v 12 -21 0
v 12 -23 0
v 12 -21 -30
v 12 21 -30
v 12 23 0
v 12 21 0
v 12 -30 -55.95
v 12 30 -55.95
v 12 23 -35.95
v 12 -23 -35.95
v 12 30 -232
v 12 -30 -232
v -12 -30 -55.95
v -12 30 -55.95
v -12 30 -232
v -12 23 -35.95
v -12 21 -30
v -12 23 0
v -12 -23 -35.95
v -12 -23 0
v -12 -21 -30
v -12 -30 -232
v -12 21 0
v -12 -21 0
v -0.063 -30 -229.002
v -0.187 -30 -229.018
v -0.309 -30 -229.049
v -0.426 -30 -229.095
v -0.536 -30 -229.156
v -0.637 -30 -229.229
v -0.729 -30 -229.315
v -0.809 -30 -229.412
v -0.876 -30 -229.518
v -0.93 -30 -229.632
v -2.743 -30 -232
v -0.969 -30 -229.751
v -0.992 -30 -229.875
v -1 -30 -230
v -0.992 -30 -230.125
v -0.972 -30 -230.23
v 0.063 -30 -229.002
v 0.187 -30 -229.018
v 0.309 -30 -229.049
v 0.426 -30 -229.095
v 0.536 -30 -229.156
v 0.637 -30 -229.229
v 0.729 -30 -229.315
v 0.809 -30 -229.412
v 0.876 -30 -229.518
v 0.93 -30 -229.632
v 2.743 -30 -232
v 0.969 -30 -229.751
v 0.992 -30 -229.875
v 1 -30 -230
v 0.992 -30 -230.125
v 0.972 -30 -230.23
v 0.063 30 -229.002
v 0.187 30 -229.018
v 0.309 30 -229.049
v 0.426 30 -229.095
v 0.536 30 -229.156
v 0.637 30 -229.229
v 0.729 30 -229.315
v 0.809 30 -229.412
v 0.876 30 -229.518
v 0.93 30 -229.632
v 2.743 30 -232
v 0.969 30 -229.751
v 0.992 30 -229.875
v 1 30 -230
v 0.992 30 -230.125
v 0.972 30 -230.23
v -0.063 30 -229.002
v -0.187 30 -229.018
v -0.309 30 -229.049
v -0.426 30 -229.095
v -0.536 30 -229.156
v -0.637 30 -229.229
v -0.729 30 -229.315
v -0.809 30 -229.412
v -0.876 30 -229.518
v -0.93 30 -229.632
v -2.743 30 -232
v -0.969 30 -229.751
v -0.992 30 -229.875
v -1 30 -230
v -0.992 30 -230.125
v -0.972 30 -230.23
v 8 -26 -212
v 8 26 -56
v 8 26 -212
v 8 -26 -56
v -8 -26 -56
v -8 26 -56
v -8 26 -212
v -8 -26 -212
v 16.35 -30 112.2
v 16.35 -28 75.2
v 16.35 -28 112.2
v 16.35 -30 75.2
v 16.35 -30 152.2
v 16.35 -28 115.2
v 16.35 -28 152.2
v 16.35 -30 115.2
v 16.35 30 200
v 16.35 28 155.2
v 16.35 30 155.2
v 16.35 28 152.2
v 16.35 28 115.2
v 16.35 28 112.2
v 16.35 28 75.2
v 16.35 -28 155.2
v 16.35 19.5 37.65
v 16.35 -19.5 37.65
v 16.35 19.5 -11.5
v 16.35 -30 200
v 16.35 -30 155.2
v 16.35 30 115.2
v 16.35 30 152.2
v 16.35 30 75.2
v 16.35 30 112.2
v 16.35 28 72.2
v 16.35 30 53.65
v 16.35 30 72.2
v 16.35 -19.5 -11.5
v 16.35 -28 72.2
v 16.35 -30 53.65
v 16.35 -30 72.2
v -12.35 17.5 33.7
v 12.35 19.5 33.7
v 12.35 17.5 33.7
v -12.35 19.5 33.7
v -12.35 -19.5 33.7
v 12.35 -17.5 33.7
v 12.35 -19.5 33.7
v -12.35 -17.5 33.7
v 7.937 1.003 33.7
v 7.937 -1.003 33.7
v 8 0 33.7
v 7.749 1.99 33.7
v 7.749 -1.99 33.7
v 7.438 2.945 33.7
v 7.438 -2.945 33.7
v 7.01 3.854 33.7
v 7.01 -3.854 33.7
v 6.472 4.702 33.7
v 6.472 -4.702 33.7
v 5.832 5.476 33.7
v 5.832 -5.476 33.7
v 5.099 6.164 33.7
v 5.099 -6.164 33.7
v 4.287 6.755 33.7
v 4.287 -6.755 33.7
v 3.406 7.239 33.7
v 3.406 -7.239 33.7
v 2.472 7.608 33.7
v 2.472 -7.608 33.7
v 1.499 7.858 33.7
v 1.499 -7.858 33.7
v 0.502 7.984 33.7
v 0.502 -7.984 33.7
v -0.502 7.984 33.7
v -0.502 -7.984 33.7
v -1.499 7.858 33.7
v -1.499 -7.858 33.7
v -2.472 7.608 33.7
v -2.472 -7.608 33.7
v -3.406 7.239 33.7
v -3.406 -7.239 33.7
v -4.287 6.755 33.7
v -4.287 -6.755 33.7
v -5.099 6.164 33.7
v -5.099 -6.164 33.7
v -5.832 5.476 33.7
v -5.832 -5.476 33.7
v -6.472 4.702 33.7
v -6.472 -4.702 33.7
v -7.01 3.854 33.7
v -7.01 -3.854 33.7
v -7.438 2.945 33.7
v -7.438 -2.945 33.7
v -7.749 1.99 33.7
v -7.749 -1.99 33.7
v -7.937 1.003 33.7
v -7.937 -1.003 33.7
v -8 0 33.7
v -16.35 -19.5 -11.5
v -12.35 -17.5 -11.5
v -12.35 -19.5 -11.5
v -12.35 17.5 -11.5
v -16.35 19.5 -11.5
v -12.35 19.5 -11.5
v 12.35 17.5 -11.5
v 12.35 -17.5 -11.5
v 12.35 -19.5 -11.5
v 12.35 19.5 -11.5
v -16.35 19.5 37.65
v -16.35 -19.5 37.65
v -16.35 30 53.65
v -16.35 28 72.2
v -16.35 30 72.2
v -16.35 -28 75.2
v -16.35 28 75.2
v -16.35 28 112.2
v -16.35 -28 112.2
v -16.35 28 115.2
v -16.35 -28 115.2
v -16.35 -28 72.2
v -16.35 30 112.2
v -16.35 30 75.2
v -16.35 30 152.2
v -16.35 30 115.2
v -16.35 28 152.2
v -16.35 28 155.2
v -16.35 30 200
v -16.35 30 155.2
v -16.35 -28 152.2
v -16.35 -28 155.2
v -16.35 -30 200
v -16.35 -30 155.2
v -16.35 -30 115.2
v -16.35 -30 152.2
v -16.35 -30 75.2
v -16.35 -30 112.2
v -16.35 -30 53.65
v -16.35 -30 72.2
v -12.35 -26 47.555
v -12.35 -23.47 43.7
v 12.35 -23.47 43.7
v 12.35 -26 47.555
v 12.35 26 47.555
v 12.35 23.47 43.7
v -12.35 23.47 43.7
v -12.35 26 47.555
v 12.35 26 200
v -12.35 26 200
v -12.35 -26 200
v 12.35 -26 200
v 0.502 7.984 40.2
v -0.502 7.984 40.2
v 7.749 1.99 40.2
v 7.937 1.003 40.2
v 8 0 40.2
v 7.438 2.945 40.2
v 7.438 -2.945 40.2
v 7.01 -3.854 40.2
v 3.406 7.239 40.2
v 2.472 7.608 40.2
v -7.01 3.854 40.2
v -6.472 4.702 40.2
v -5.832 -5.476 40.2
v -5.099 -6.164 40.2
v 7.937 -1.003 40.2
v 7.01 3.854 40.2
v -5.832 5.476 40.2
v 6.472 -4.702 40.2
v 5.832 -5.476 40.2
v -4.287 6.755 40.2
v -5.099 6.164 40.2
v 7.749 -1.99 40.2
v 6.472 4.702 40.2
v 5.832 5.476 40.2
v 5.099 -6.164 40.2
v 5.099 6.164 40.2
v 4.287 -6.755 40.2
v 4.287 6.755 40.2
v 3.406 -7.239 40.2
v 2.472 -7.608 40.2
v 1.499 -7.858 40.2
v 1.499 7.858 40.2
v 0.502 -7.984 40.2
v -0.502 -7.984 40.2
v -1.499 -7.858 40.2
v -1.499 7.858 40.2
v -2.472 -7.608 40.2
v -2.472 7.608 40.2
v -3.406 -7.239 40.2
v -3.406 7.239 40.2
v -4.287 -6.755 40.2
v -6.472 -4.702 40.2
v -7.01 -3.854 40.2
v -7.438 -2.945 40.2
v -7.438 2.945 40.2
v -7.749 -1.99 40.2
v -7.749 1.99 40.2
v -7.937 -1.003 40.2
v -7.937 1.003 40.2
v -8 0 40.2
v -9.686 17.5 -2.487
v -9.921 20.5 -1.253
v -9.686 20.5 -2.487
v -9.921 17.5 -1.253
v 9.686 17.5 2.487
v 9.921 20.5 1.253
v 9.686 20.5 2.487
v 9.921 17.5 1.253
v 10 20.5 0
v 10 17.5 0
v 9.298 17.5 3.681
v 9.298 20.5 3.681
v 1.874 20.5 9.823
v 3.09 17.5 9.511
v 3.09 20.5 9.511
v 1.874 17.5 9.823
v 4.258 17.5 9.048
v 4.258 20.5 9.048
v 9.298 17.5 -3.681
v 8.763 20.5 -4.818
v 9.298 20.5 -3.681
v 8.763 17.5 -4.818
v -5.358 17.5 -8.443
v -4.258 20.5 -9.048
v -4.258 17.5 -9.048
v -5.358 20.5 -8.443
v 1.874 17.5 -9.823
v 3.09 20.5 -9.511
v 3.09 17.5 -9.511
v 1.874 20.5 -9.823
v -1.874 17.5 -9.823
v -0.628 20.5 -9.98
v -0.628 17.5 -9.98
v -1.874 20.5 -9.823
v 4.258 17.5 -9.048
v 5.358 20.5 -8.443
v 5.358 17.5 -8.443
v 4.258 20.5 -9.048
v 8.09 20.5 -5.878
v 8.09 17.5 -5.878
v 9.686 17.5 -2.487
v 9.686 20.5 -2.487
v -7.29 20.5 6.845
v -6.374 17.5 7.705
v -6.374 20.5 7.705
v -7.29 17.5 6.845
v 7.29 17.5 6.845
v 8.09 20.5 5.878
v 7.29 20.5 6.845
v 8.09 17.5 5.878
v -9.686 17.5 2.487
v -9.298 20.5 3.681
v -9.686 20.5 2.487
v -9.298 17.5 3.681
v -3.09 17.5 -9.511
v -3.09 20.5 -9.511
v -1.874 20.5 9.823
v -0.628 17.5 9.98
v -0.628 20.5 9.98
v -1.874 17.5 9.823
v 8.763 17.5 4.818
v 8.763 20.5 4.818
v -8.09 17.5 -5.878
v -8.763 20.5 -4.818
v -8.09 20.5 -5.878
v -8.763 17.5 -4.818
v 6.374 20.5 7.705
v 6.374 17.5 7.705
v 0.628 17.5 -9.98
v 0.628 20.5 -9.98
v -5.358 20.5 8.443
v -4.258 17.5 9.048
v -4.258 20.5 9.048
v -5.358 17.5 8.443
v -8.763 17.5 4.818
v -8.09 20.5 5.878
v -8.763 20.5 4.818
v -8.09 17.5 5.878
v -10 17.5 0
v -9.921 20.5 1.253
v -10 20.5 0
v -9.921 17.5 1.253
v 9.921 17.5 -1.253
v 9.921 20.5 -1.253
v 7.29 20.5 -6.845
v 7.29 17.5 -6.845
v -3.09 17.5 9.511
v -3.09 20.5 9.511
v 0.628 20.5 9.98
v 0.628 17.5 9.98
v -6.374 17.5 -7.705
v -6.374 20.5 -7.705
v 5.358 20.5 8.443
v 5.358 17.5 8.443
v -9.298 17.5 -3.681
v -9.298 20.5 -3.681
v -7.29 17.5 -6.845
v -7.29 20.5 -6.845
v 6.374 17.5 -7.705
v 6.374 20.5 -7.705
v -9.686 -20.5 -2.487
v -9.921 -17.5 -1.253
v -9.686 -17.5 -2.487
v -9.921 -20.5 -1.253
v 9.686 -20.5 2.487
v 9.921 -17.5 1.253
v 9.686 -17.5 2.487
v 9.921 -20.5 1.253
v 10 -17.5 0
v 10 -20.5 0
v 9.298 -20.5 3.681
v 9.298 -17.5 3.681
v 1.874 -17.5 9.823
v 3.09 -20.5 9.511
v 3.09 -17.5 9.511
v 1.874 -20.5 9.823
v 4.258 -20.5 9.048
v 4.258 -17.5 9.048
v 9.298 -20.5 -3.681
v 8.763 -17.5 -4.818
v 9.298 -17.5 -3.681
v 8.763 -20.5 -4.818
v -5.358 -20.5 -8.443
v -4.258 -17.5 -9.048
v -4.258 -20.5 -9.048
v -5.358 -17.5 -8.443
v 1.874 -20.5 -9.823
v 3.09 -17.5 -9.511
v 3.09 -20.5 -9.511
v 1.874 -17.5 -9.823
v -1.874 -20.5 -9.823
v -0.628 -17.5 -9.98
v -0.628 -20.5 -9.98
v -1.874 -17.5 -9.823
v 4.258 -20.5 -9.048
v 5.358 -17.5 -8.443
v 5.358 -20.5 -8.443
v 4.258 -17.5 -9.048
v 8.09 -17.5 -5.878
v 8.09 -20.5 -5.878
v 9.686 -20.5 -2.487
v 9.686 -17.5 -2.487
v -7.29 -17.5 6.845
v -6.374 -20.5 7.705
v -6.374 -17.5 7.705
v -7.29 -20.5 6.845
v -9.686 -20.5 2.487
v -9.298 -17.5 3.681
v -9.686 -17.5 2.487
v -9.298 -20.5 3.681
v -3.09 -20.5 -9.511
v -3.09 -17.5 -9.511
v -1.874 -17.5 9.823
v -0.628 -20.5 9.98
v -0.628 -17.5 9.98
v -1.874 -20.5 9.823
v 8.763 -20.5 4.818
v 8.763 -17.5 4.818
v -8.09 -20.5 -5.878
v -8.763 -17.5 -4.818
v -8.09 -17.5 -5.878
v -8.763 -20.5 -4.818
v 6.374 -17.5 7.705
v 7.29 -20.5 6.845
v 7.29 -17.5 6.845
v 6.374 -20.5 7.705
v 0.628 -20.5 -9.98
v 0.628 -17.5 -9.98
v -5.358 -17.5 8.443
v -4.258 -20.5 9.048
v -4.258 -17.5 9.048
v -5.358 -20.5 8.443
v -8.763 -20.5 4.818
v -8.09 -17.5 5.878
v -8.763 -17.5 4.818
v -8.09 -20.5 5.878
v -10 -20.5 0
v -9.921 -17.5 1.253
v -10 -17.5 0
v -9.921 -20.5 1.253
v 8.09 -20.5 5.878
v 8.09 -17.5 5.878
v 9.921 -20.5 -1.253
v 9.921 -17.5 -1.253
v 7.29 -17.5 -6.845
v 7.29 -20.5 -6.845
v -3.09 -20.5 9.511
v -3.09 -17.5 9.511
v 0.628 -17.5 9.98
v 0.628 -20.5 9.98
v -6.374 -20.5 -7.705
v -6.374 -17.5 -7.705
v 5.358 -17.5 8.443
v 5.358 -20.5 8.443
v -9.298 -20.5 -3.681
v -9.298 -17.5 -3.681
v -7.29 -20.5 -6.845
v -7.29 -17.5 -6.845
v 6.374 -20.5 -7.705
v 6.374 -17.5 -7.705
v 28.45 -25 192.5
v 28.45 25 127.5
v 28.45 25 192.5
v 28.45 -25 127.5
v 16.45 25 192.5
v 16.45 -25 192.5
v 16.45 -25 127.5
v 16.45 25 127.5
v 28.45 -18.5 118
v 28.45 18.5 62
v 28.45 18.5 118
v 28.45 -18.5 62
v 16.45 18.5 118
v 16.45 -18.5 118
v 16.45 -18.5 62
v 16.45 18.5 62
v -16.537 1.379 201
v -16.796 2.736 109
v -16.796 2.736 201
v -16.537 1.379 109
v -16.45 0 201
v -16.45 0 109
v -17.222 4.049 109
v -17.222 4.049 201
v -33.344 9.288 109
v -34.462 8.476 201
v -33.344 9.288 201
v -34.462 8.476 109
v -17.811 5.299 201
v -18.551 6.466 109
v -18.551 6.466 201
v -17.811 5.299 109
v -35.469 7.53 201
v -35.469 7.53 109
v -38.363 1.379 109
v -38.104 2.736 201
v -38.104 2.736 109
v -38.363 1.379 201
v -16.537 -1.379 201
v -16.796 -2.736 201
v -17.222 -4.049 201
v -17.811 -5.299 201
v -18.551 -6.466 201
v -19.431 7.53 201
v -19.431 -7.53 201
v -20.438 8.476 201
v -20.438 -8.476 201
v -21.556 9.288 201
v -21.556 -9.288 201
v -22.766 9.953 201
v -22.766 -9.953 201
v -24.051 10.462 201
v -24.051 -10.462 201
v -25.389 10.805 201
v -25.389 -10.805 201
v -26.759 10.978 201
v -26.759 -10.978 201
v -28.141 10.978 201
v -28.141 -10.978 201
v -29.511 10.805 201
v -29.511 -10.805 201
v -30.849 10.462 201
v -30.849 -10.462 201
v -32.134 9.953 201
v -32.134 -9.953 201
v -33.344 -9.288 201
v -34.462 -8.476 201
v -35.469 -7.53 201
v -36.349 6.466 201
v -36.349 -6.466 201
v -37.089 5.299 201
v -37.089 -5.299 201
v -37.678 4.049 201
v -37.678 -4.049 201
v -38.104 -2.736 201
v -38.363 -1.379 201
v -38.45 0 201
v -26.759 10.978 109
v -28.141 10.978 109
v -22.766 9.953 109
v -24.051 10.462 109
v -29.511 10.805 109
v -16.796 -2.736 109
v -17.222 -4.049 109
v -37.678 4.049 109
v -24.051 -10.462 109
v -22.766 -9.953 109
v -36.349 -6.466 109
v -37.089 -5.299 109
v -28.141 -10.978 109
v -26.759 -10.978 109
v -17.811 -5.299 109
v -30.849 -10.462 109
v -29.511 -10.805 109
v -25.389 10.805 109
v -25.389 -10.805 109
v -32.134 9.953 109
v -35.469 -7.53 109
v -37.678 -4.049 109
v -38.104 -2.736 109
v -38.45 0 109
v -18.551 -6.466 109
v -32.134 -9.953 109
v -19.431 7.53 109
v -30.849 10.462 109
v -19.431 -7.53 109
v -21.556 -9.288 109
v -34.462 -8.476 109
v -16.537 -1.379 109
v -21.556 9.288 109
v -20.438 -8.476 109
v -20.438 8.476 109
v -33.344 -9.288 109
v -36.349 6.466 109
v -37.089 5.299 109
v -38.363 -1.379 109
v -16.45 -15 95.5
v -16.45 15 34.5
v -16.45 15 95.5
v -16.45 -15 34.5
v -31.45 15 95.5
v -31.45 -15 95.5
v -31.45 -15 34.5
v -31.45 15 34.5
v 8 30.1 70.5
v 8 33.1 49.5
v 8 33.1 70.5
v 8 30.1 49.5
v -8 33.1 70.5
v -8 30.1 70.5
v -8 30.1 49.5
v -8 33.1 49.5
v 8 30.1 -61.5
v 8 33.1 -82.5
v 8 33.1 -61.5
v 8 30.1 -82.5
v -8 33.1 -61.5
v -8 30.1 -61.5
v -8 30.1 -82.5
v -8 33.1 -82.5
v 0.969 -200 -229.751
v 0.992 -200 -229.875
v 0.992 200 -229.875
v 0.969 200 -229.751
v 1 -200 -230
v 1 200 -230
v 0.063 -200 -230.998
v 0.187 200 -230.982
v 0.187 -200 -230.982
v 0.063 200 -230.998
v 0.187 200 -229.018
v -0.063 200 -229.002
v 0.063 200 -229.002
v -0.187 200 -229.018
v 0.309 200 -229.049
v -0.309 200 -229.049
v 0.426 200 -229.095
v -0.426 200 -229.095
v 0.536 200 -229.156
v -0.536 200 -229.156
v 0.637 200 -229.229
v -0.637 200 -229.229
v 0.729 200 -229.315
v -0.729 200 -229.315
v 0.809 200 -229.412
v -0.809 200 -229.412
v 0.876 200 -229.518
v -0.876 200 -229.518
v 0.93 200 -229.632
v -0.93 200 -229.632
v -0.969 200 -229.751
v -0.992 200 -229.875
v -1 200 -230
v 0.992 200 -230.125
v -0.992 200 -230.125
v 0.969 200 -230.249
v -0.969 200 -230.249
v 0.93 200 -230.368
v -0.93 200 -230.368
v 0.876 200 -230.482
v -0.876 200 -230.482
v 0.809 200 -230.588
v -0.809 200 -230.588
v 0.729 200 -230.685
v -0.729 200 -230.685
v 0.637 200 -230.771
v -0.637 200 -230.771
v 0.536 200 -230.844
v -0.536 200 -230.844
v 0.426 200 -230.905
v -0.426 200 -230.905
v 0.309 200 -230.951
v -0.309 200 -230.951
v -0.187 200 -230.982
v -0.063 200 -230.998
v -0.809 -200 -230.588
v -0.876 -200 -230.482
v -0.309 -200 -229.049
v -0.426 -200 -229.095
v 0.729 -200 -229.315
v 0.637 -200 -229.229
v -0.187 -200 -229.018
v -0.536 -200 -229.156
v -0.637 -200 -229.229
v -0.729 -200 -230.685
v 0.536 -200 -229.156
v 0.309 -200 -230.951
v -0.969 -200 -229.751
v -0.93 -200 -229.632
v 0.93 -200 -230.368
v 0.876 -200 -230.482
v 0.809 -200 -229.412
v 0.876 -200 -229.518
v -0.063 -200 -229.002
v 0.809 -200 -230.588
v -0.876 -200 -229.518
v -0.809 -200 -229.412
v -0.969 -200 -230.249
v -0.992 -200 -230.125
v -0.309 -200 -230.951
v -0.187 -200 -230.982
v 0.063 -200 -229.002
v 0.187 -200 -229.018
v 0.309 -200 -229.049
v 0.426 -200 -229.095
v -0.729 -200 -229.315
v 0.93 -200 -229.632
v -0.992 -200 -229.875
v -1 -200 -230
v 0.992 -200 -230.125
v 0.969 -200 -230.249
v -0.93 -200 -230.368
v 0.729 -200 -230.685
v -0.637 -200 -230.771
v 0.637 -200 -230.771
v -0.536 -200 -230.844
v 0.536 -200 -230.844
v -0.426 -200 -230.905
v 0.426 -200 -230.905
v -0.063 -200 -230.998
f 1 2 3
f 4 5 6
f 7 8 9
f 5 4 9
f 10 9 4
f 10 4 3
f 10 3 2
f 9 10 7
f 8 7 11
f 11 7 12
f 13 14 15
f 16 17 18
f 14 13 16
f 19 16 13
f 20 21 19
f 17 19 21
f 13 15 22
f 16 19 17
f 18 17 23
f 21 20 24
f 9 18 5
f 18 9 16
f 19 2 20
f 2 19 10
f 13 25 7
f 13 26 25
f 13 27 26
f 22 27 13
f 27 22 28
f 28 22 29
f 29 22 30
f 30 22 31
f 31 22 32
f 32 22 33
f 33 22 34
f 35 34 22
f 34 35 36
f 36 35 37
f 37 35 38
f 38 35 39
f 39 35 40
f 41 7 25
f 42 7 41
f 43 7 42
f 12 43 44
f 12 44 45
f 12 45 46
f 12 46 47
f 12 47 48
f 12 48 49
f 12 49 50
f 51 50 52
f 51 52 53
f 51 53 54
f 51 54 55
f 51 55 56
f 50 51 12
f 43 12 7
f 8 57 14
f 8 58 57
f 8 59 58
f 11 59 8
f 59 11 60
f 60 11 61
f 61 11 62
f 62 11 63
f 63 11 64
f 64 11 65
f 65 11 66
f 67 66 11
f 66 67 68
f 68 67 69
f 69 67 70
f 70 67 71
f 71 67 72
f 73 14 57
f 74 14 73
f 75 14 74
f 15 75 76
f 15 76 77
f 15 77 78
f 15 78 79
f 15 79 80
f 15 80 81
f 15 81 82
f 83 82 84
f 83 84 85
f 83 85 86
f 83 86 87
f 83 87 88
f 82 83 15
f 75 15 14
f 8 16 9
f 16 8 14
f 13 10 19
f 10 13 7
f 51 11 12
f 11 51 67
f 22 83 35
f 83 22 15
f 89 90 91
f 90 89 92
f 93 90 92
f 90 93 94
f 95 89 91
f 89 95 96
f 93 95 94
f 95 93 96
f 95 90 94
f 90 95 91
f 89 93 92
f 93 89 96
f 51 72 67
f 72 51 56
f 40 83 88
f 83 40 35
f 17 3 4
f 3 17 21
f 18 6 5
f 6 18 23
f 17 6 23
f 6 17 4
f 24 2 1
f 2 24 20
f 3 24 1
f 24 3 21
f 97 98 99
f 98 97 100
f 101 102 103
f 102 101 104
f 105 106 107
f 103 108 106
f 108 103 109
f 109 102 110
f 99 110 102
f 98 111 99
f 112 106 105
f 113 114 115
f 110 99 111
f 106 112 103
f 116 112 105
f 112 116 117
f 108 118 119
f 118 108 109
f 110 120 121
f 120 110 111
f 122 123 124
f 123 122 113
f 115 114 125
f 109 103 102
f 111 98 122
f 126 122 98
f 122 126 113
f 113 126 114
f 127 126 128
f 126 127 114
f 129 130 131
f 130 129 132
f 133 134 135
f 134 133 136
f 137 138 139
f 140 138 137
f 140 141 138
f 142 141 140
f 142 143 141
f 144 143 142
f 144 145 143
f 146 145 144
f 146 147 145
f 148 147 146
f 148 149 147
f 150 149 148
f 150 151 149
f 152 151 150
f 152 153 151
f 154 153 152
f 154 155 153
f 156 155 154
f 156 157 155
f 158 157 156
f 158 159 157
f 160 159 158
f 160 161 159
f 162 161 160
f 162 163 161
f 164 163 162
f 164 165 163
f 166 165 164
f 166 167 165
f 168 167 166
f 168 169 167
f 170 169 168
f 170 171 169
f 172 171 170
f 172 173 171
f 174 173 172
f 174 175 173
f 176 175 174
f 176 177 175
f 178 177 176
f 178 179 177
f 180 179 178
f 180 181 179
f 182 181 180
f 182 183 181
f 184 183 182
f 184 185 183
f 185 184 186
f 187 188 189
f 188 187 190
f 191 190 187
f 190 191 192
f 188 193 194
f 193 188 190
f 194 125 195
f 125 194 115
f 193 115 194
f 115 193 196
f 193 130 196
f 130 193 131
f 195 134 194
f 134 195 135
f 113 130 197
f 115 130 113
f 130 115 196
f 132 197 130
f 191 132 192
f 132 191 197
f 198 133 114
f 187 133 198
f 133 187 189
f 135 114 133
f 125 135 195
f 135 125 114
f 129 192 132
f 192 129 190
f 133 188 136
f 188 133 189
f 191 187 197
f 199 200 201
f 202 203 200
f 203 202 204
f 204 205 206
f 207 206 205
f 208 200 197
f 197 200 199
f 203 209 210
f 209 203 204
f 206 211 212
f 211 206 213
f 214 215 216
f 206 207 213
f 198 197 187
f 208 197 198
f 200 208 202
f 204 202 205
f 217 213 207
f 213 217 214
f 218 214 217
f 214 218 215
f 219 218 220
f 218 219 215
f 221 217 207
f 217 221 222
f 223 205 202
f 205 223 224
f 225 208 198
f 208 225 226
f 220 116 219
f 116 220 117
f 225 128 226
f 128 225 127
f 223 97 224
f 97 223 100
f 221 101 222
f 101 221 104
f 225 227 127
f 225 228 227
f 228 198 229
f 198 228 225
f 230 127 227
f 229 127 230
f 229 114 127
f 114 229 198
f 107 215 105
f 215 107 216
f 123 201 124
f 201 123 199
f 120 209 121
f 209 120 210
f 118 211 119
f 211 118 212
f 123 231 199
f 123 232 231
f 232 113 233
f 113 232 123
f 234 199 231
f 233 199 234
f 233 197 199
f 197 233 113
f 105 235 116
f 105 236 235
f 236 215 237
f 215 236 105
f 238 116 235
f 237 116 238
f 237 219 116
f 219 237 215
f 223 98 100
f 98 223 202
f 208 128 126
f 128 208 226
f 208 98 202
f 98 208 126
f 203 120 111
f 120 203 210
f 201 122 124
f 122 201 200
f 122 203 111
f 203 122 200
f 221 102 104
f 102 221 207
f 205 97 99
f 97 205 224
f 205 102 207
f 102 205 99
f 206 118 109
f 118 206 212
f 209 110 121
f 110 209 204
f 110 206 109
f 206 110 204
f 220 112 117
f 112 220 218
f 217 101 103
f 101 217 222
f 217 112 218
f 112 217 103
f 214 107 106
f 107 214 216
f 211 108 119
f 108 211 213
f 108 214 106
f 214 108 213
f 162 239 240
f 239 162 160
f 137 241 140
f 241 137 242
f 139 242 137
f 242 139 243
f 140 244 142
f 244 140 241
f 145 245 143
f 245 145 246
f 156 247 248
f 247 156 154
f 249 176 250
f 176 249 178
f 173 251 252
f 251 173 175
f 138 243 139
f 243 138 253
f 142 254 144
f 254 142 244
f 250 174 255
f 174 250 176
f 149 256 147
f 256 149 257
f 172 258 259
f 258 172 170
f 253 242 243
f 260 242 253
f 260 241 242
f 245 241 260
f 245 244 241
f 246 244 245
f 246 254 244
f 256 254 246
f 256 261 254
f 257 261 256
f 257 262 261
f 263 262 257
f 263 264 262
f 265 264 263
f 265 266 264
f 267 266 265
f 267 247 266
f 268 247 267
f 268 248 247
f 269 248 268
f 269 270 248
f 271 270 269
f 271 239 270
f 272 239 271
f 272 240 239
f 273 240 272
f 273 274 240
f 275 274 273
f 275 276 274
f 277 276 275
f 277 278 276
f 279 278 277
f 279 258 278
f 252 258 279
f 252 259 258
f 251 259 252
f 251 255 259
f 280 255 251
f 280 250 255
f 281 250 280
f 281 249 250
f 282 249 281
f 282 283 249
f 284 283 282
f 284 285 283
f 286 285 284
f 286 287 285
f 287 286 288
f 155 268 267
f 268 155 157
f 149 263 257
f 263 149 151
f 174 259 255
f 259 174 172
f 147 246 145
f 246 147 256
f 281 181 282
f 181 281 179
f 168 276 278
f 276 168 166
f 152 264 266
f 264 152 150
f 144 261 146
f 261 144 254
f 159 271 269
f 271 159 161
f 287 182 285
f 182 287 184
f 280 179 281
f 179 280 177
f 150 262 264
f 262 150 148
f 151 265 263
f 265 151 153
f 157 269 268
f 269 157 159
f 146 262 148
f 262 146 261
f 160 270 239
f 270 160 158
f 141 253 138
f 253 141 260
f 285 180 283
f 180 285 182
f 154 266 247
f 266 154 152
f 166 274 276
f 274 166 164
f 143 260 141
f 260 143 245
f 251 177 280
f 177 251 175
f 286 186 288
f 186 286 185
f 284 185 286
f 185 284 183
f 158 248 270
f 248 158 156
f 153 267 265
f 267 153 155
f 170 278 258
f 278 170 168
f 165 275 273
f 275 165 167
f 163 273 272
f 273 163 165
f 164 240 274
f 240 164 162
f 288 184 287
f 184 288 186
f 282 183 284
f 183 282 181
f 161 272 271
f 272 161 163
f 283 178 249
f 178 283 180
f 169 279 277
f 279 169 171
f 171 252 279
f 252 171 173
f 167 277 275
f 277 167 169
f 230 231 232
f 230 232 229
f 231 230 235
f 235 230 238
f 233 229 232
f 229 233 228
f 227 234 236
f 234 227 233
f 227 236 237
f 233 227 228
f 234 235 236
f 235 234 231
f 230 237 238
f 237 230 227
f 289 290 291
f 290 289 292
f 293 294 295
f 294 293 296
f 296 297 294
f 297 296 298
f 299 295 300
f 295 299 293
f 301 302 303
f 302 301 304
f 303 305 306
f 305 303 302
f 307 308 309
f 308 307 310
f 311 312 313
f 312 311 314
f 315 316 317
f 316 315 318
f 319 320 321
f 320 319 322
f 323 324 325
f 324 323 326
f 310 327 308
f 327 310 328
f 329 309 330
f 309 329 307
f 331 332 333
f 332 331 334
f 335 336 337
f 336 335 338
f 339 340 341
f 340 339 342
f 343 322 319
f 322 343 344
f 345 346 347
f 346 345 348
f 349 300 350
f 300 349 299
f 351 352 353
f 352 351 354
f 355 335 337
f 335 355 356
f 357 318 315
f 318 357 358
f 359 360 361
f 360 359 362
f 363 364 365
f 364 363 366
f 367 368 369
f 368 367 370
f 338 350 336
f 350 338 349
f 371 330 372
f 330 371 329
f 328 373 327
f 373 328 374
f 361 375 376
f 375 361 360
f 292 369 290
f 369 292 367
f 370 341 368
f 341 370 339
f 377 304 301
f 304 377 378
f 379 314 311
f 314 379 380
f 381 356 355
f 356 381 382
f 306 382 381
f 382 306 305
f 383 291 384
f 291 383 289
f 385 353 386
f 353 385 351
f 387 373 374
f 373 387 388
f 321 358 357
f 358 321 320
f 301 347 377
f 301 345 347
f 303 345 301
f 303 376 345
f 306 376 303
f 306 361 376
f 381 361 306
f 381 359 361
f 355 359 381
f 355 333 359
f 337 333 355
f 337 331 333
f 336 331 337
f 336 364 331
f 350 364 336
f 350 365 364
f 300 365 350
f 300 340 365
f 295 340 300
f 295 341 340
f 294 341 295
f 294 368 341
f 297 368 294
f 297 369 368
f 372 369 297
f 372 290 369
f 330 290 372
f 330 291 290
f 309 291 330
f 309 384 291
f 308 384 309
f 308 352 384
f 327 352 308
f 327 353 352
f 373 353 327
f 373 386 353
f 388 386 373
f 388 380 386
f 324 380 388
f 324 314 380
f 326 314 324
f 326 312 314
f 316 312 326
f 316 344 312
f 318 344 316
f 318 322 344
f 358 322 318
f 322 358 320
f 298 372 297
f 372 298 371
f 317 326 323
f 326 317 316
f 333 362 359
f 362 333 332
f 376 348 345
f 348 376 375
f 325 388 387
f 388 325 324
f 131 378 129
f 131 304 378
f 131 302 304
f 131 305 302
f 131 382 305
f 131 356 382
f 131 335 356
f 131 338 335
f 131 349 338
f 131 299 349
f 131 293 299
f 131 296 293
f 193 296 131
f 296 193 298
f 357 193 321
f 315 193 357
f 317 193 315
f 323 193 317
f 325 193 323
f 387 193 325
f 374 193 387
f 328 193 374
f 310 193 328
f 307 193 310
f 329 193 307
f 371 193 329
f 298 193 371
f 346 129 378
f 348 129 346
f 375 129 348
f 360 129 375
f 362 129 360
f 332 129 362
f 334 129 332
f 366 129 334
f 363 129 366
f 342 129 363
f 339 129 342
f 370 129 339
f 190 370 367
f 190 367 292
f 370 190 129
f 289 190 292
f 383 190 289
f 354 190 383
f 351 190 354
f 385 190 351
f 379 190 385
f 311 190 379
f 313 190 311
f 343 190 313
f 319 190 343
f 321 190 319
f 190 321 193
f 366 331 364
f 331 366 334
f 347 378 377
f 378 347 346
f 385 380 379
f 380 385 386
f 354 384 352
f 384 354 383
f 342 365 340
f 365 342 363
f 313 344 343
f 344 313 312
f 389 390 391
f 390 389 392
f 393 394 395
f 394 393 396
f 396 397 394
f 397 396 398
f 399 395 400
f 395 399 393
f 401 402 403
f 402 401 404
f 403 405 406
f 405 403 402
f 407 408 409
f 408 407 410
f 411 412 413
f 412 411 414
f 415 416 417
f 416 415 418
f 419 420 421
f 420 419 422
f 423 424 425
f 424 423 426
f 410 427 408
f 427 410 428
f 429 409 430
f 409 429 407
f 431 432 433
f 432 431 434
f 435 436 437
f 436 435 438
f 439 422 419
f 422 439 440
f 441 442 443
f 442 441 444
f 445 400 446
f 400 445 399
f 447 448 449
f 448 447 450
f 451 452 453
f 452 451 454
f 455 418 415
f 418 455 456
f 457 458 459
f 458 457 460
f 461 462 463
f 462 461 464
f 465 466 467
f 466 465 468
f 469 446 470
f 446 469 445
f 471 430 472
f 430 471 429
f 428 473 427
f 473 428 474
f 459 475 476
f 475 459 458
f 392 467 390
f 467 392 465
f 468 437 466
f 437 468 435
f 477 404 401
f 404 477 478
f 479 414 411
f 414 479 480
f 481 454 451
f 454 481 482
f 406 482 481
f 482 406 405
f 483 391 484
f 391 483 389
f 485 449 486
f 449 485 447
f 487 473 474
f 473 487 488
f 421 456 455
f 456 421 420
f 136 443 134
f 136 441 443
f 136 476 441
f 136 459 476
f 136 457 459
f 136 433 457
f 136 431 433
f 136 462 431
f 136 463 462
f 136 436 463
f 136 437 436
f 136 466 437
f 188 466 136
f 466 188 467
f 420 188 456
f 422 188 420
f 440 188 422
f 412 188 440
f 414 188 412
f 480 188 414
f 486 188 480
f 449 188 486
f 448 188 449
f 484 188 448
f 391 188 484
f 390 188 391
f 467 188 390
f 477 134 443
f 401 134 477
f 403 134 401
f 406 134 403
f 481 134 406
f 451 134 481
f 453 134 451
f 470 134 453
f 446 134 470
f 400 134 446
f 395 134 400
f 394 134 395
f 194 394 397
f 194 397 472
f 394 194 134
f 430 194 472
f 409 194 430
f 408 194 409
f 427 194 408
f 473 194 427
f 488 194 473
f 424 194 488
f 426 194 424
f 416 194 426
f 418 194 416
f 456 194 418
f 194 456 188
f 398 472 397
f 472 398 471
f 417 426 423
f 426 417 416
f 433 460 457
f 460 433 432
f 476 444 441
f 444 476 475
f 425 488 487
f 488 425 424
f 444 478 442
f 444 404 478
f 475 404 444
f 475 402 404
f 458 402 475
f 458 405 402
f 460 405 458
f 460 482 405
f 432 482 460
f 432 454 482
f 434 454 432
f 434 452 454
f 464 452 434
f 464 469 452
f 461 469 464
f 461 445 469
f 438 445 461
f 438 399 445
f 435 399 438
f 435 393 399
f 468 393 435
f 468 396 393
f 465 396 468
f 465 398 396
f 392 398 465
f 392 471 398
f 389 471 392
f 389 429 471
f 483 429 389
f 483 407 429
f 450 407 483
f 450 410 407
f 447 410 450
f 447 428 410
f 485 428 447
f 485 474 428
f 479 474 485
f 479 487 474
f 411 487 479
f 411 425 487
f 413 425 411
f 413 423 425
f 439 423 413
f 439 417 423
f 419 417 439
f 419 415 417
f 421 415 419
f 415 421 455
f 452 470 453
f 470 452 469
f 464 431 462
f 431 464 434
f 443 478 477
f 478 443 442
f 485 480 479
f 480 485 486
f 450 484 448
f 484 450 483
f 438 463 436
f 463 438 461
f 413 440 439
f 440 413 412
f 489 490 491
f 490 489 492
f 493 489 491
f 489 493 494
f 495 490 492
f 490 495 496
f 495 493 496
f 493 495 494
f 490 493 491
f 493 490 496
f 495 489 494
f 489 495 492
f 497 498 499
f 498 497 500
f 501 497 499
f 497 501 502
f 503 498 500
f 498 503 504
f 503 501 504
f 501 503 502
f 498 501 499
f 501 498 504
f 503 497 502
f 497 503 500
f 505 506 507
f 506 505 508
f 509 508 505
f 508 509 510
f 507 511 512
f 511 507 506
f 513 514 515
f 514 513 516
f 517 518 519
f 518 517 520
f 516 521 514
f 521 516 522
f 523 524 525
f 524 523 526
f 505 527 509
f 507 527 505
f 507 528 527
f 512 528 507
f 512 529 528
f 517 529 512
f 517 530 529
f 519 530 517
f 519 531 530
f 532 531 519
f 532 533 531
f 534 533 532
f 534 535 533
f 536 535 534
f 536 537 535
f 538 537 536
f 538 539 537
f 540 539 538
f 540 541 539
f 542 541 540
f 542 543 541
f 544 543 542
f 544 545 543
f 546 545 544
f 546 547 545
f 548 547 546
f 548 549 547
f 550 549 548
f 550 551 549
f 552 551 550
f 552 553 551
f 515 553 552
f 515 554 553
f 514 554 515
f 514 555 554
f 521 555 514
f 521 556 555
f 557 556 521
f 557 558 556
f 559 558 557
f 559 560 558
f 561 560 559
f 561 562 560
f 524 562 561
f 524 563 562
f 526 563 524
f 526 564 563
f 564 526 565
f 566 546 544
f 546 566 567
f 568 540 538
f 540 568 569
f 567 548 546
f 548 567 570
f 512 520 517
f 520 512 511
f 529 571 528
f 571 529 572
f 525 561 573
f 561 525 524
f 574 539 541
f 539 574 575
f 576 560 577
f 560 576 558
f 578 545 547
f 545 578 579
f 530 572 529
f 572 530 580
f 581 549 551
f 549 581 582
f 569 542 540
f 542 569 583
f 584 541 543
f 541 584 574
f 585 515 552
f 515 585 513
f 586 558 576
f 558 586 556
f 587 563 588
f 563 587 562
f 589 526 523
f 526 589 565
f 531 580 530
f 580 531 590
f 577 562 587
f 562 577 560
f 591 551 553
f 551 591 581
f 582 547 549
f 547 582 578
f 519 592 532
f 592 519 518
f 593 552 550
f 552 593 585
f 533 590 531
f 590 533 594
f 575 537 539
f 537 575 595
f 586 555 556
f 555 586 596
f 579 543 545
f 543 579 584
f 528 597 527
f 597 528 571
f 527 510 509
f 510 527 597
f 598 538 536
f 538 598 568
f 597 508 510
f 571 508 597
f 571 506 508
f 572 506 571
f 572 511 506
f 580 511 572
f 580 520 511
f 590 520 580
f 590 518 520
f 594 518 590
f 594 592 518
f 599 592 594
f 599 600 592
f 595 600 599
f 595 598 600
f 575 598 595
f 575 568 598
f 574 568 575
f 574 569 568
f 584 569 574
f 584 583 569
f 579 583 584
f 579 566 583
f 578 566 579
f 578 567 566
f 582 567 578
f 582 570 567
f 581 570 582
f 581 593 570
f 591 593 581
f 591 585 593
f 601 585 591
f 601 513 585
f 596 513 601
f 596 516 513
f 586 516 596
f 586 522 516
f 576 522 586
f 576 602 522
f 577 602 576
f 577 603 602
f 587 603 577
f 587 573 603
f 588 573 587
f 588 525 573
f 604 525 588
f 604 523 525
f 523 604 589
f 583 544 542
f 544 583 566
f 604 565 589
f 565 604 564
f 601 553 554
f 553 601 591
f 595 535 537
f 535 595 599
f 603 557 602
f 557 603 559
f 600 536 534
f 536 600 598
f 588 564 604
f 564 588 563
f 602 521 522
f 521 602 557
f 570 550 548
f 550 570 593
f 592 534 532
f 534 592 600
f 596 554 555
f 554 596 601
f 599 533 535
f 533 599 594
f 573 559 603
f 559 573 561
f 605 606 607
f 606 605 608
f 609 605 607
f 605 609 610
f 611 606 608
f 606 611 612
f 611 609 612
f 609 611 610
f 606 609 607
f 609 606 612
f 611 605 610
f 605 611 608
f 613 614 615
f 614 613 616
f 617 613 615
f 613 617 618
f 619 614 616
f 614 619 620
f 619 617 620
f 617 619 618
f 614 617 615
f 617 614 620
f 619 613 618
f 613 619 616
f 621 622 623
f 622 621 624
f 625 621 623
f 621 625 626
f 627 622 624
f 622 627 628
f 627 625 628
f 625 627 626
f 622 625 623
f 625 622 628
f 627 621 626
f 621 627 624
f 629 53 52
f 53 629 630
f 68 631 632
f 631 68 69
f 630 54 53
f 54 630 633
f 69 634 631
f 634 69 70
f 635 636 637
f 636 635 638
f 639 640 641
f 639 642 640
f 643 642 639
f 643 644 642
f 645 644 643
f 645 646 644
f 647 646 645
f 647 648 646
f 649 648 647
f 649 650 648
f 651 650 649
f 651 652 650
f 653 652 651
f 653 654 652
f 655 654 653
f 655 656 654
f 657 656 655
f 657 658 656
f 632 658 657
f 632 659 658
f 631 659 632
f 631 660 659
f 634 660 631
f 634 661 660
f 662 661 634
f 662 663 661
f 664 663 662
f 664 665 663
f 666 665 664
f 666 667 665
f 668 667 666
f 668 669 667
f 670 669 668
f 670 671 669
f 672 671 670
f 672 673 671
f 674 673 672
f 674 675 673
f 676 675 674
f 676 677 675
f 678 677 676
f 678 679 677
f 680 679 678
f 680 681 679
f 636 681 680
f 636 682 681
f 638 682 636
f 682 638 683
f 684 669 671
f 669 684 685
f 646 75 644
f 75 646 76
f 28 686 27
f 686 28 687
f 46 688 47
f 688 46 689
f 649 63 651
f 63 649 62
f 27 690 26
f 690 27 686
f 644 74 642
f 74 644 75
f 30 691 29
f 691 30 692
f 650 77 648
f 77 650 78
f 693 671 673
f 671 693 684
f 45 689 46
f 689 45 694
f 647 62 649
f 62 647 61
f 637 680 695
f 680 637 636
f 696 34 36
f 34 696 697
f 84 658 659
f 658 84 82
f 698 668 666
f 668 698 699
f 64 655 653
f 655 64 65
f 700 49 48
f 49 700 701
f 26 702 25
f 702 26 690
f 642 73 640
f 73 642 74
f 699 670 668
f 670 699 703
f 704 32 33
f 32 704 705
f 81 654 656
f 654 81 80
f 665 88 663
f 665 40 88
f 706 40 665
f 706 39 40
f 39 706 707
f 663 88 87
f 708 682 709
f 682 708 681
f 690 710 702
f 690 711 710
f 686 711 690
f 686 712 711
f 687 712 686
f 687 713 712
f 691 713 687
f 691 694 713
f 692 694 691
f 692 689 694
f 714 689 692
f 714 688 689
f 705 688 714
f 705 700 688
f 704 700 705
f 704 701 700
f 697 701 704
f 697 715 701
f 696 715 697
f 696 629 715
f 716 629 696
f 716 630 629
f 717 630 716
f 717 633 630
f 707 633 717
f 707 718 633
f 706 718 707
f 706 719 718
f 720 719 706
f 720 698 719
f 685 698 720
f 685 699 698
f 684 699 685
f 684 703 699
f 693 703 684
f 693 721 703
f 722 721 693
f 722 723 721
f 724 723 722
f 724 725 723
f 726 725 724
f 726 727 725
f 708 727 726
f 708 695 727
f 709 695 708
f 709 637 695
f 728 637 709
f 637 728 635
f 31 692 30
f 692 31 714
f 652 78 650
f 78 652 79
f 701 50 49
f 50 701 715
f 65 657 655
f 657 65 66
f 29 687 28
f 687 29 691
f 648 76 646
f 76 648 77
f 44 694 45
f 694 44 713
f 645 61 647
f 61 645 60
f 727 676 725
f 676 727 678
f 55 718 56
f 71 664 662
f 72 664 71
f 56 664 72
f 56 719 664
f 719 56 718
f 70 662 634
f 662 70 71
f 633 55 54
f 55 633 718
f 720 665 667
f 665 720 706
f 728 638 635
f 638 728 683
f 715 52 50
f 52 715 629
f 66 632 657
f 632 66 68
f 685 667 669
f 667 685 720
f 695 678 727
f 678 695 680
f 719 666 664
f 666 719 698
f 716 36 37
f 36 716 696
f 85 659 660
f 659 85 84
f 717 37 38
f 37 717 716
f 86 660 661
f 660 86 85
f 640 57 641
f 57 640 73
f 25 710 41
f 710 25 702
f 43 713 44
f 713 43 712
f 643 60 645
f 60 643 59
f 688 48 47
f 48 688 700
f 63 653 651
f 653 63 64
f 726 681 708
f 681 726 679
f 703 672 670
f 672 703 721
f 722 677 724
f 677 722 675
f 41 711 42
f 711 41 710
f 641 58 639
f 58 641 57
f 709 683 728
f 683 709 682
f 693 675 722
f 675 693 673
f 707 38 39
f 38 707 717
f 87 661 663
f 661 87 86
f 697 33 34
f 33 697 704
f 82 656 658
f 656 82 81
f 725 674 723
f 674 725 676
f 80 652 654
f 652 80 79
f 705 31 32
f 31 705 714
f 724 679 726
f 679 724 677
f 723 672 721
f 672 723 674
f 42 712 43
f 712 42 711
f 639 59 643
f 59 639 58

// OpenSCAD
/*
  2026 전람회 "줄타기 밸런싱 로봇" - V11 시뮬레이션용 간소화 모델
  
  원본 대비 변경사항:
  - 전선(베지어 곡선 배선) 모두 제거
  - 나사/볼트 시각화 모두 제거  
  - 모터 나사 구멍 관통 시각화 제거
  - 큰 부품만 유지: 상체 프레임, 하체 프레임, 모터, U브라켓, 
    ESP32, URT1, LiPo배터리, 보조배터리, MPU6050 x2
*/

$fn = 50; 
tilt_angle = 30 * sin($t * 360); 

// ==========================================
// ⚙️ 하드웨어 치수 파라미터 
// ==========================================
upper_length = 200; lower_length = 200; col_y_target = 60.0; 

// [모터 및 브라켓]
motor_x = 24.7; motor_y = 35.0; motor_z_up = 33.7; motor_z_down = 11.5; motor_z = 45.2;
horn_d = 20.0; horn_h = 3.0;
b_inner_y = 42.0; b_w = 24.0; b_arm_l = 30.0; b_thick = 2.0; 
rope_d = 2.0; 

// ⭐ [전자부품 실측 치수]
esp_w = 50.0; esp_h = 65.0; esp_d = 12.0;
urt_w = 37.0; urt_h = 56.0; urt_d = 12.0;
bat_w = 30.0; bat_h = 61.0; bat_d = 15.0;  // 7.4V LiPo (모터 구동 전용)
pb_d  = 22.0; pb_h  = 92.0;                // 5V 보조 배터리 (ESP32 전용)
mpu_w = 16.0; mpu_h = 21.0; mpu_d = 3.0;

plate_t = 4.0; 
up_x_fixed = motor_x + (plate_t * 2); 
low_x_fixed = b_w;                    

view_mode = 0; 
b_bot_z = -b_arm_l - b_thick;
rope_z = b_bot_z - lower_length + 2.0; 

// ==========================================
// 👁️ 렌더링 및 애니메이션
// ==========================================
if (view_mode == 0) {
    // 줄 (슬랙라인)
    color("DarkOrange") translate([0, 0, rope_z]) rotate([90, 0, 0]) 
        cylinder(d=rope_d, h=400, center=true);
    
    // 하체 어셈블리 (줄에 매달림 + 틸트)
    translate([0, 0, rope_z]) rotate([0, tilt_angle, 0]) translate([0, 0, -rope_z]) {
        color("DimGray", 0.4) lower_body();
        color("Silver") u_bracket_dummy();
        lower_electronics(); 
        
        // 상체 어셈블리 (힙 관절 회전)
        U_rot = -tilt_angle * 1.5;
        rotate([0, U_rot, 0]) { 
            color("LightSkyBlue", 0.4) upper_body(); 
            motor_dummy(); 
            upper_electronics(); 
        }
    }
} else if (view_mode == 1) upper_body();
  else if (view_mode == 2) lower_body();

// ==========================================
// 🧱 상체 프레임
// ==========================================
module upper_body() {
    difference() {
        union() {
            z_center = (motor_z_up - motor_z_down)/2;
            // 좌우 측판
            translate([motor_x/2 + plate_t/2, 0, z_center]) 
                cube([plate_t, motor_y + 4, motor_z], center=true);
            translate([-motor_x/2 - plate_t/2, 0, z_center]) 
                cube([plate_t, motor_y + 4, motor_z], center=true);
            // 상판
            translate([0, 0, motor_z_up + plate_t/2]) 
                cube([up_x_fixed, motor_y + 4, plate_t], center=true);
            // 테이퍼 구간
            hull() {
                translate([0, 0, motor_z_up + plate_t]) 
                    cube([up_x_fixed, motor_y + 4, 0.1], center=true);
                translate([0, 0, motor_z_up + 20]) 
                    cube([up_x_fixed, col_y_target, 0.1], center=true);
            }
            // 칼럼 본체
            h_len = upper_length - (motor_z_up + 20);
            translate([0, 0, motor_z_up + 20 + h_len/2]) 
                cube([up_x_fixed, col_y_target, h_len], center=true);
        }
        
        // 모터축 관통 구멍
        translate([0, 0, motor_z_up + plate_t/2]) 
            cylinder(d=16, h=plate_t + 5, center=true);
        
        // 내부 중공
        h_len2 = upper_length - (motor_z_up + 10);
        translate([0, 0, motor_z_up + 10 + h_len2/2]) 
            cube([up_x_fixed - 8, col_y_target - 8, h_len2], center=true);
            
        // 환기/경량화 슬릿
        for(z = [motor_z_up + 40 : 40 : upper_length - 20]) {
            translate([0, -col_y_target/2, z]) 
                cube([up_x_fixed + 10, 4, 3], center=true);
            translate([0,  col_y_target/2, z]) 
                cube([up_x_fixed + 10, 4, 3], center=true);
        }
    }
}

// ==========================================
// 🧱 하체 프레임
// ==========================================
module lower_body() {
    translate([0, 0, b_bot_z])
    difference() {
        union() {
            // 상판 (브라켓 체결부)
            translate([0, 0, -2]) 
                cube([low_x_fixed, b_inner_y + b_thick*2, 4], center=true);
            // 테이퍼 구간
            hull() {
                translate([0, 0, -4]) 
                    cube([low_x_fixed, b_inner_y + b_thick*2, 0.1], center=true);
                translate([0, 0, -24]) 
                    cube([low_x_fixed, col_y_target, 0.1], center=true);
            }
            // 칼럼 본체
            h_len = lower_length - 24;
            translate([0, 0, -24 - h_len/2]) 
                cube([low_x_fixed, col_y_target, h_len], center=true);
        }
        
        // 내부 중공
        h_len2 = lower_length - 24 - 20;
        translate([0, 0, -24 - h_len2/2]) 
            cube([low_x_fixed - 8, col_y_target - 8, h_len2], center=true);
        
        // 바닥 V형 노치 (줄 접촉)
        translate([0, 0, -lower_length - 1.5]) rotate([0, 45, 0]) 
            cube([6, col_y_target + 10, 6], center=true);
    }
}

// ==========================================
// 🔩 모터 본체 (나사 제거)
// ==========================================
module motor_dummy() {
    z_center = (motor_z_up - motor_z_down)/2;
    // 모터 본체
    color("DarkSlateGray") translate([0, 0, z_center]) 
        cube([motor_x, motor_y, motor_z], center=true);
    // 서보 혼 (양쪽)
    color("Gold") {
        translate([0, motor_y/2 + 1.5, 0]) rotate([90, 0, 0]) 
            cylinder(d=horn_d, h=horn_h, center=true);
        translate([0, -motor_y/2 - 1.5, 0]) rotate([90, 0, 0]) 
            cylinder(d=horn_d, h=horn_h, center=true);
    }
}

// ==========================================
// 🔩 U자 브라켓 (볼트 제거)
// ==========================================
module u_bracket_dummy() {
    color("Silver") {
        // 바닥판
        translate([0, 0, b_bot_z + b_thick/2]) 
            cube([b_w, b_inner_y + 2*b_thick, b_thick], center=true);
        // 좌측 팔
        translate([0, b_inner_y/2 + b_thick/2, -b_arm_l/2]) 
            cube([b_w, b_thick, b_arm_l], center=true);
        // 우측 팔
        translate([0, -b_inner_y/2 - b_thick/2, -b_arm_l/2]) 
            cube([b_w, b_thick, b_arm_l], center=true);
    }
}

// ==========================================
// 📦 상체 전자부품 (전선 없이 부품만)
// ==========================================
module upper_electronics() {
    // +X면: ESP32 (상단)
    color("ForestGreen") translate([up_x_fixed/2 + esp_d/2 + 0.1, 0, 160]) 
        cube([esp_d, esp_w, esp_h], center=true);
    
    // +X면: URT1 (하단)
    color("Goldenrod") translate([up_x_fixed/2 + urt_d/2 + 0.1, 0, 90]) 
        cube([urt_d, urt_w, urt_h], center=true);
    
    // -X면 (등판): 원통형 5V 보조배터리 (상단)
    color("White") translate([-up_x_fixed/2 - pb_d/2 - 0.1, 0, 155]) 
        cylinder(d=pb_d, h=pb_h, center=true);
    
    // -X면 (등판): 7.4V LiPo 배터리 (하단)
    color("RoyalBlue") translate([-up_x_fixed/2 - bat_d/2 - 0.1, 0, 65]) 
        cube([bat_d, bat_w, bat_h], center=true);
    
    // +Y면: 상체 MPU6050
    color("Crimson") translate([0, col_y_target/2 + mpu_d/2 + 0.1, 60]) 
        cube([mpu_w, mpu_d, mpu_h], center=true);
}

// ==========================================
// 📦 하체 전자부품
// ==========================================
module lower_electronics() {
    // +Y면: 하체 MPU6050
    color("Crimson") translate([0, col_y_target/2 + mpu_d/2 + 0.1, b_bot_z - 40]) 
        cube([mpu_w, mpu_d, mpu_h], center=true);
}
